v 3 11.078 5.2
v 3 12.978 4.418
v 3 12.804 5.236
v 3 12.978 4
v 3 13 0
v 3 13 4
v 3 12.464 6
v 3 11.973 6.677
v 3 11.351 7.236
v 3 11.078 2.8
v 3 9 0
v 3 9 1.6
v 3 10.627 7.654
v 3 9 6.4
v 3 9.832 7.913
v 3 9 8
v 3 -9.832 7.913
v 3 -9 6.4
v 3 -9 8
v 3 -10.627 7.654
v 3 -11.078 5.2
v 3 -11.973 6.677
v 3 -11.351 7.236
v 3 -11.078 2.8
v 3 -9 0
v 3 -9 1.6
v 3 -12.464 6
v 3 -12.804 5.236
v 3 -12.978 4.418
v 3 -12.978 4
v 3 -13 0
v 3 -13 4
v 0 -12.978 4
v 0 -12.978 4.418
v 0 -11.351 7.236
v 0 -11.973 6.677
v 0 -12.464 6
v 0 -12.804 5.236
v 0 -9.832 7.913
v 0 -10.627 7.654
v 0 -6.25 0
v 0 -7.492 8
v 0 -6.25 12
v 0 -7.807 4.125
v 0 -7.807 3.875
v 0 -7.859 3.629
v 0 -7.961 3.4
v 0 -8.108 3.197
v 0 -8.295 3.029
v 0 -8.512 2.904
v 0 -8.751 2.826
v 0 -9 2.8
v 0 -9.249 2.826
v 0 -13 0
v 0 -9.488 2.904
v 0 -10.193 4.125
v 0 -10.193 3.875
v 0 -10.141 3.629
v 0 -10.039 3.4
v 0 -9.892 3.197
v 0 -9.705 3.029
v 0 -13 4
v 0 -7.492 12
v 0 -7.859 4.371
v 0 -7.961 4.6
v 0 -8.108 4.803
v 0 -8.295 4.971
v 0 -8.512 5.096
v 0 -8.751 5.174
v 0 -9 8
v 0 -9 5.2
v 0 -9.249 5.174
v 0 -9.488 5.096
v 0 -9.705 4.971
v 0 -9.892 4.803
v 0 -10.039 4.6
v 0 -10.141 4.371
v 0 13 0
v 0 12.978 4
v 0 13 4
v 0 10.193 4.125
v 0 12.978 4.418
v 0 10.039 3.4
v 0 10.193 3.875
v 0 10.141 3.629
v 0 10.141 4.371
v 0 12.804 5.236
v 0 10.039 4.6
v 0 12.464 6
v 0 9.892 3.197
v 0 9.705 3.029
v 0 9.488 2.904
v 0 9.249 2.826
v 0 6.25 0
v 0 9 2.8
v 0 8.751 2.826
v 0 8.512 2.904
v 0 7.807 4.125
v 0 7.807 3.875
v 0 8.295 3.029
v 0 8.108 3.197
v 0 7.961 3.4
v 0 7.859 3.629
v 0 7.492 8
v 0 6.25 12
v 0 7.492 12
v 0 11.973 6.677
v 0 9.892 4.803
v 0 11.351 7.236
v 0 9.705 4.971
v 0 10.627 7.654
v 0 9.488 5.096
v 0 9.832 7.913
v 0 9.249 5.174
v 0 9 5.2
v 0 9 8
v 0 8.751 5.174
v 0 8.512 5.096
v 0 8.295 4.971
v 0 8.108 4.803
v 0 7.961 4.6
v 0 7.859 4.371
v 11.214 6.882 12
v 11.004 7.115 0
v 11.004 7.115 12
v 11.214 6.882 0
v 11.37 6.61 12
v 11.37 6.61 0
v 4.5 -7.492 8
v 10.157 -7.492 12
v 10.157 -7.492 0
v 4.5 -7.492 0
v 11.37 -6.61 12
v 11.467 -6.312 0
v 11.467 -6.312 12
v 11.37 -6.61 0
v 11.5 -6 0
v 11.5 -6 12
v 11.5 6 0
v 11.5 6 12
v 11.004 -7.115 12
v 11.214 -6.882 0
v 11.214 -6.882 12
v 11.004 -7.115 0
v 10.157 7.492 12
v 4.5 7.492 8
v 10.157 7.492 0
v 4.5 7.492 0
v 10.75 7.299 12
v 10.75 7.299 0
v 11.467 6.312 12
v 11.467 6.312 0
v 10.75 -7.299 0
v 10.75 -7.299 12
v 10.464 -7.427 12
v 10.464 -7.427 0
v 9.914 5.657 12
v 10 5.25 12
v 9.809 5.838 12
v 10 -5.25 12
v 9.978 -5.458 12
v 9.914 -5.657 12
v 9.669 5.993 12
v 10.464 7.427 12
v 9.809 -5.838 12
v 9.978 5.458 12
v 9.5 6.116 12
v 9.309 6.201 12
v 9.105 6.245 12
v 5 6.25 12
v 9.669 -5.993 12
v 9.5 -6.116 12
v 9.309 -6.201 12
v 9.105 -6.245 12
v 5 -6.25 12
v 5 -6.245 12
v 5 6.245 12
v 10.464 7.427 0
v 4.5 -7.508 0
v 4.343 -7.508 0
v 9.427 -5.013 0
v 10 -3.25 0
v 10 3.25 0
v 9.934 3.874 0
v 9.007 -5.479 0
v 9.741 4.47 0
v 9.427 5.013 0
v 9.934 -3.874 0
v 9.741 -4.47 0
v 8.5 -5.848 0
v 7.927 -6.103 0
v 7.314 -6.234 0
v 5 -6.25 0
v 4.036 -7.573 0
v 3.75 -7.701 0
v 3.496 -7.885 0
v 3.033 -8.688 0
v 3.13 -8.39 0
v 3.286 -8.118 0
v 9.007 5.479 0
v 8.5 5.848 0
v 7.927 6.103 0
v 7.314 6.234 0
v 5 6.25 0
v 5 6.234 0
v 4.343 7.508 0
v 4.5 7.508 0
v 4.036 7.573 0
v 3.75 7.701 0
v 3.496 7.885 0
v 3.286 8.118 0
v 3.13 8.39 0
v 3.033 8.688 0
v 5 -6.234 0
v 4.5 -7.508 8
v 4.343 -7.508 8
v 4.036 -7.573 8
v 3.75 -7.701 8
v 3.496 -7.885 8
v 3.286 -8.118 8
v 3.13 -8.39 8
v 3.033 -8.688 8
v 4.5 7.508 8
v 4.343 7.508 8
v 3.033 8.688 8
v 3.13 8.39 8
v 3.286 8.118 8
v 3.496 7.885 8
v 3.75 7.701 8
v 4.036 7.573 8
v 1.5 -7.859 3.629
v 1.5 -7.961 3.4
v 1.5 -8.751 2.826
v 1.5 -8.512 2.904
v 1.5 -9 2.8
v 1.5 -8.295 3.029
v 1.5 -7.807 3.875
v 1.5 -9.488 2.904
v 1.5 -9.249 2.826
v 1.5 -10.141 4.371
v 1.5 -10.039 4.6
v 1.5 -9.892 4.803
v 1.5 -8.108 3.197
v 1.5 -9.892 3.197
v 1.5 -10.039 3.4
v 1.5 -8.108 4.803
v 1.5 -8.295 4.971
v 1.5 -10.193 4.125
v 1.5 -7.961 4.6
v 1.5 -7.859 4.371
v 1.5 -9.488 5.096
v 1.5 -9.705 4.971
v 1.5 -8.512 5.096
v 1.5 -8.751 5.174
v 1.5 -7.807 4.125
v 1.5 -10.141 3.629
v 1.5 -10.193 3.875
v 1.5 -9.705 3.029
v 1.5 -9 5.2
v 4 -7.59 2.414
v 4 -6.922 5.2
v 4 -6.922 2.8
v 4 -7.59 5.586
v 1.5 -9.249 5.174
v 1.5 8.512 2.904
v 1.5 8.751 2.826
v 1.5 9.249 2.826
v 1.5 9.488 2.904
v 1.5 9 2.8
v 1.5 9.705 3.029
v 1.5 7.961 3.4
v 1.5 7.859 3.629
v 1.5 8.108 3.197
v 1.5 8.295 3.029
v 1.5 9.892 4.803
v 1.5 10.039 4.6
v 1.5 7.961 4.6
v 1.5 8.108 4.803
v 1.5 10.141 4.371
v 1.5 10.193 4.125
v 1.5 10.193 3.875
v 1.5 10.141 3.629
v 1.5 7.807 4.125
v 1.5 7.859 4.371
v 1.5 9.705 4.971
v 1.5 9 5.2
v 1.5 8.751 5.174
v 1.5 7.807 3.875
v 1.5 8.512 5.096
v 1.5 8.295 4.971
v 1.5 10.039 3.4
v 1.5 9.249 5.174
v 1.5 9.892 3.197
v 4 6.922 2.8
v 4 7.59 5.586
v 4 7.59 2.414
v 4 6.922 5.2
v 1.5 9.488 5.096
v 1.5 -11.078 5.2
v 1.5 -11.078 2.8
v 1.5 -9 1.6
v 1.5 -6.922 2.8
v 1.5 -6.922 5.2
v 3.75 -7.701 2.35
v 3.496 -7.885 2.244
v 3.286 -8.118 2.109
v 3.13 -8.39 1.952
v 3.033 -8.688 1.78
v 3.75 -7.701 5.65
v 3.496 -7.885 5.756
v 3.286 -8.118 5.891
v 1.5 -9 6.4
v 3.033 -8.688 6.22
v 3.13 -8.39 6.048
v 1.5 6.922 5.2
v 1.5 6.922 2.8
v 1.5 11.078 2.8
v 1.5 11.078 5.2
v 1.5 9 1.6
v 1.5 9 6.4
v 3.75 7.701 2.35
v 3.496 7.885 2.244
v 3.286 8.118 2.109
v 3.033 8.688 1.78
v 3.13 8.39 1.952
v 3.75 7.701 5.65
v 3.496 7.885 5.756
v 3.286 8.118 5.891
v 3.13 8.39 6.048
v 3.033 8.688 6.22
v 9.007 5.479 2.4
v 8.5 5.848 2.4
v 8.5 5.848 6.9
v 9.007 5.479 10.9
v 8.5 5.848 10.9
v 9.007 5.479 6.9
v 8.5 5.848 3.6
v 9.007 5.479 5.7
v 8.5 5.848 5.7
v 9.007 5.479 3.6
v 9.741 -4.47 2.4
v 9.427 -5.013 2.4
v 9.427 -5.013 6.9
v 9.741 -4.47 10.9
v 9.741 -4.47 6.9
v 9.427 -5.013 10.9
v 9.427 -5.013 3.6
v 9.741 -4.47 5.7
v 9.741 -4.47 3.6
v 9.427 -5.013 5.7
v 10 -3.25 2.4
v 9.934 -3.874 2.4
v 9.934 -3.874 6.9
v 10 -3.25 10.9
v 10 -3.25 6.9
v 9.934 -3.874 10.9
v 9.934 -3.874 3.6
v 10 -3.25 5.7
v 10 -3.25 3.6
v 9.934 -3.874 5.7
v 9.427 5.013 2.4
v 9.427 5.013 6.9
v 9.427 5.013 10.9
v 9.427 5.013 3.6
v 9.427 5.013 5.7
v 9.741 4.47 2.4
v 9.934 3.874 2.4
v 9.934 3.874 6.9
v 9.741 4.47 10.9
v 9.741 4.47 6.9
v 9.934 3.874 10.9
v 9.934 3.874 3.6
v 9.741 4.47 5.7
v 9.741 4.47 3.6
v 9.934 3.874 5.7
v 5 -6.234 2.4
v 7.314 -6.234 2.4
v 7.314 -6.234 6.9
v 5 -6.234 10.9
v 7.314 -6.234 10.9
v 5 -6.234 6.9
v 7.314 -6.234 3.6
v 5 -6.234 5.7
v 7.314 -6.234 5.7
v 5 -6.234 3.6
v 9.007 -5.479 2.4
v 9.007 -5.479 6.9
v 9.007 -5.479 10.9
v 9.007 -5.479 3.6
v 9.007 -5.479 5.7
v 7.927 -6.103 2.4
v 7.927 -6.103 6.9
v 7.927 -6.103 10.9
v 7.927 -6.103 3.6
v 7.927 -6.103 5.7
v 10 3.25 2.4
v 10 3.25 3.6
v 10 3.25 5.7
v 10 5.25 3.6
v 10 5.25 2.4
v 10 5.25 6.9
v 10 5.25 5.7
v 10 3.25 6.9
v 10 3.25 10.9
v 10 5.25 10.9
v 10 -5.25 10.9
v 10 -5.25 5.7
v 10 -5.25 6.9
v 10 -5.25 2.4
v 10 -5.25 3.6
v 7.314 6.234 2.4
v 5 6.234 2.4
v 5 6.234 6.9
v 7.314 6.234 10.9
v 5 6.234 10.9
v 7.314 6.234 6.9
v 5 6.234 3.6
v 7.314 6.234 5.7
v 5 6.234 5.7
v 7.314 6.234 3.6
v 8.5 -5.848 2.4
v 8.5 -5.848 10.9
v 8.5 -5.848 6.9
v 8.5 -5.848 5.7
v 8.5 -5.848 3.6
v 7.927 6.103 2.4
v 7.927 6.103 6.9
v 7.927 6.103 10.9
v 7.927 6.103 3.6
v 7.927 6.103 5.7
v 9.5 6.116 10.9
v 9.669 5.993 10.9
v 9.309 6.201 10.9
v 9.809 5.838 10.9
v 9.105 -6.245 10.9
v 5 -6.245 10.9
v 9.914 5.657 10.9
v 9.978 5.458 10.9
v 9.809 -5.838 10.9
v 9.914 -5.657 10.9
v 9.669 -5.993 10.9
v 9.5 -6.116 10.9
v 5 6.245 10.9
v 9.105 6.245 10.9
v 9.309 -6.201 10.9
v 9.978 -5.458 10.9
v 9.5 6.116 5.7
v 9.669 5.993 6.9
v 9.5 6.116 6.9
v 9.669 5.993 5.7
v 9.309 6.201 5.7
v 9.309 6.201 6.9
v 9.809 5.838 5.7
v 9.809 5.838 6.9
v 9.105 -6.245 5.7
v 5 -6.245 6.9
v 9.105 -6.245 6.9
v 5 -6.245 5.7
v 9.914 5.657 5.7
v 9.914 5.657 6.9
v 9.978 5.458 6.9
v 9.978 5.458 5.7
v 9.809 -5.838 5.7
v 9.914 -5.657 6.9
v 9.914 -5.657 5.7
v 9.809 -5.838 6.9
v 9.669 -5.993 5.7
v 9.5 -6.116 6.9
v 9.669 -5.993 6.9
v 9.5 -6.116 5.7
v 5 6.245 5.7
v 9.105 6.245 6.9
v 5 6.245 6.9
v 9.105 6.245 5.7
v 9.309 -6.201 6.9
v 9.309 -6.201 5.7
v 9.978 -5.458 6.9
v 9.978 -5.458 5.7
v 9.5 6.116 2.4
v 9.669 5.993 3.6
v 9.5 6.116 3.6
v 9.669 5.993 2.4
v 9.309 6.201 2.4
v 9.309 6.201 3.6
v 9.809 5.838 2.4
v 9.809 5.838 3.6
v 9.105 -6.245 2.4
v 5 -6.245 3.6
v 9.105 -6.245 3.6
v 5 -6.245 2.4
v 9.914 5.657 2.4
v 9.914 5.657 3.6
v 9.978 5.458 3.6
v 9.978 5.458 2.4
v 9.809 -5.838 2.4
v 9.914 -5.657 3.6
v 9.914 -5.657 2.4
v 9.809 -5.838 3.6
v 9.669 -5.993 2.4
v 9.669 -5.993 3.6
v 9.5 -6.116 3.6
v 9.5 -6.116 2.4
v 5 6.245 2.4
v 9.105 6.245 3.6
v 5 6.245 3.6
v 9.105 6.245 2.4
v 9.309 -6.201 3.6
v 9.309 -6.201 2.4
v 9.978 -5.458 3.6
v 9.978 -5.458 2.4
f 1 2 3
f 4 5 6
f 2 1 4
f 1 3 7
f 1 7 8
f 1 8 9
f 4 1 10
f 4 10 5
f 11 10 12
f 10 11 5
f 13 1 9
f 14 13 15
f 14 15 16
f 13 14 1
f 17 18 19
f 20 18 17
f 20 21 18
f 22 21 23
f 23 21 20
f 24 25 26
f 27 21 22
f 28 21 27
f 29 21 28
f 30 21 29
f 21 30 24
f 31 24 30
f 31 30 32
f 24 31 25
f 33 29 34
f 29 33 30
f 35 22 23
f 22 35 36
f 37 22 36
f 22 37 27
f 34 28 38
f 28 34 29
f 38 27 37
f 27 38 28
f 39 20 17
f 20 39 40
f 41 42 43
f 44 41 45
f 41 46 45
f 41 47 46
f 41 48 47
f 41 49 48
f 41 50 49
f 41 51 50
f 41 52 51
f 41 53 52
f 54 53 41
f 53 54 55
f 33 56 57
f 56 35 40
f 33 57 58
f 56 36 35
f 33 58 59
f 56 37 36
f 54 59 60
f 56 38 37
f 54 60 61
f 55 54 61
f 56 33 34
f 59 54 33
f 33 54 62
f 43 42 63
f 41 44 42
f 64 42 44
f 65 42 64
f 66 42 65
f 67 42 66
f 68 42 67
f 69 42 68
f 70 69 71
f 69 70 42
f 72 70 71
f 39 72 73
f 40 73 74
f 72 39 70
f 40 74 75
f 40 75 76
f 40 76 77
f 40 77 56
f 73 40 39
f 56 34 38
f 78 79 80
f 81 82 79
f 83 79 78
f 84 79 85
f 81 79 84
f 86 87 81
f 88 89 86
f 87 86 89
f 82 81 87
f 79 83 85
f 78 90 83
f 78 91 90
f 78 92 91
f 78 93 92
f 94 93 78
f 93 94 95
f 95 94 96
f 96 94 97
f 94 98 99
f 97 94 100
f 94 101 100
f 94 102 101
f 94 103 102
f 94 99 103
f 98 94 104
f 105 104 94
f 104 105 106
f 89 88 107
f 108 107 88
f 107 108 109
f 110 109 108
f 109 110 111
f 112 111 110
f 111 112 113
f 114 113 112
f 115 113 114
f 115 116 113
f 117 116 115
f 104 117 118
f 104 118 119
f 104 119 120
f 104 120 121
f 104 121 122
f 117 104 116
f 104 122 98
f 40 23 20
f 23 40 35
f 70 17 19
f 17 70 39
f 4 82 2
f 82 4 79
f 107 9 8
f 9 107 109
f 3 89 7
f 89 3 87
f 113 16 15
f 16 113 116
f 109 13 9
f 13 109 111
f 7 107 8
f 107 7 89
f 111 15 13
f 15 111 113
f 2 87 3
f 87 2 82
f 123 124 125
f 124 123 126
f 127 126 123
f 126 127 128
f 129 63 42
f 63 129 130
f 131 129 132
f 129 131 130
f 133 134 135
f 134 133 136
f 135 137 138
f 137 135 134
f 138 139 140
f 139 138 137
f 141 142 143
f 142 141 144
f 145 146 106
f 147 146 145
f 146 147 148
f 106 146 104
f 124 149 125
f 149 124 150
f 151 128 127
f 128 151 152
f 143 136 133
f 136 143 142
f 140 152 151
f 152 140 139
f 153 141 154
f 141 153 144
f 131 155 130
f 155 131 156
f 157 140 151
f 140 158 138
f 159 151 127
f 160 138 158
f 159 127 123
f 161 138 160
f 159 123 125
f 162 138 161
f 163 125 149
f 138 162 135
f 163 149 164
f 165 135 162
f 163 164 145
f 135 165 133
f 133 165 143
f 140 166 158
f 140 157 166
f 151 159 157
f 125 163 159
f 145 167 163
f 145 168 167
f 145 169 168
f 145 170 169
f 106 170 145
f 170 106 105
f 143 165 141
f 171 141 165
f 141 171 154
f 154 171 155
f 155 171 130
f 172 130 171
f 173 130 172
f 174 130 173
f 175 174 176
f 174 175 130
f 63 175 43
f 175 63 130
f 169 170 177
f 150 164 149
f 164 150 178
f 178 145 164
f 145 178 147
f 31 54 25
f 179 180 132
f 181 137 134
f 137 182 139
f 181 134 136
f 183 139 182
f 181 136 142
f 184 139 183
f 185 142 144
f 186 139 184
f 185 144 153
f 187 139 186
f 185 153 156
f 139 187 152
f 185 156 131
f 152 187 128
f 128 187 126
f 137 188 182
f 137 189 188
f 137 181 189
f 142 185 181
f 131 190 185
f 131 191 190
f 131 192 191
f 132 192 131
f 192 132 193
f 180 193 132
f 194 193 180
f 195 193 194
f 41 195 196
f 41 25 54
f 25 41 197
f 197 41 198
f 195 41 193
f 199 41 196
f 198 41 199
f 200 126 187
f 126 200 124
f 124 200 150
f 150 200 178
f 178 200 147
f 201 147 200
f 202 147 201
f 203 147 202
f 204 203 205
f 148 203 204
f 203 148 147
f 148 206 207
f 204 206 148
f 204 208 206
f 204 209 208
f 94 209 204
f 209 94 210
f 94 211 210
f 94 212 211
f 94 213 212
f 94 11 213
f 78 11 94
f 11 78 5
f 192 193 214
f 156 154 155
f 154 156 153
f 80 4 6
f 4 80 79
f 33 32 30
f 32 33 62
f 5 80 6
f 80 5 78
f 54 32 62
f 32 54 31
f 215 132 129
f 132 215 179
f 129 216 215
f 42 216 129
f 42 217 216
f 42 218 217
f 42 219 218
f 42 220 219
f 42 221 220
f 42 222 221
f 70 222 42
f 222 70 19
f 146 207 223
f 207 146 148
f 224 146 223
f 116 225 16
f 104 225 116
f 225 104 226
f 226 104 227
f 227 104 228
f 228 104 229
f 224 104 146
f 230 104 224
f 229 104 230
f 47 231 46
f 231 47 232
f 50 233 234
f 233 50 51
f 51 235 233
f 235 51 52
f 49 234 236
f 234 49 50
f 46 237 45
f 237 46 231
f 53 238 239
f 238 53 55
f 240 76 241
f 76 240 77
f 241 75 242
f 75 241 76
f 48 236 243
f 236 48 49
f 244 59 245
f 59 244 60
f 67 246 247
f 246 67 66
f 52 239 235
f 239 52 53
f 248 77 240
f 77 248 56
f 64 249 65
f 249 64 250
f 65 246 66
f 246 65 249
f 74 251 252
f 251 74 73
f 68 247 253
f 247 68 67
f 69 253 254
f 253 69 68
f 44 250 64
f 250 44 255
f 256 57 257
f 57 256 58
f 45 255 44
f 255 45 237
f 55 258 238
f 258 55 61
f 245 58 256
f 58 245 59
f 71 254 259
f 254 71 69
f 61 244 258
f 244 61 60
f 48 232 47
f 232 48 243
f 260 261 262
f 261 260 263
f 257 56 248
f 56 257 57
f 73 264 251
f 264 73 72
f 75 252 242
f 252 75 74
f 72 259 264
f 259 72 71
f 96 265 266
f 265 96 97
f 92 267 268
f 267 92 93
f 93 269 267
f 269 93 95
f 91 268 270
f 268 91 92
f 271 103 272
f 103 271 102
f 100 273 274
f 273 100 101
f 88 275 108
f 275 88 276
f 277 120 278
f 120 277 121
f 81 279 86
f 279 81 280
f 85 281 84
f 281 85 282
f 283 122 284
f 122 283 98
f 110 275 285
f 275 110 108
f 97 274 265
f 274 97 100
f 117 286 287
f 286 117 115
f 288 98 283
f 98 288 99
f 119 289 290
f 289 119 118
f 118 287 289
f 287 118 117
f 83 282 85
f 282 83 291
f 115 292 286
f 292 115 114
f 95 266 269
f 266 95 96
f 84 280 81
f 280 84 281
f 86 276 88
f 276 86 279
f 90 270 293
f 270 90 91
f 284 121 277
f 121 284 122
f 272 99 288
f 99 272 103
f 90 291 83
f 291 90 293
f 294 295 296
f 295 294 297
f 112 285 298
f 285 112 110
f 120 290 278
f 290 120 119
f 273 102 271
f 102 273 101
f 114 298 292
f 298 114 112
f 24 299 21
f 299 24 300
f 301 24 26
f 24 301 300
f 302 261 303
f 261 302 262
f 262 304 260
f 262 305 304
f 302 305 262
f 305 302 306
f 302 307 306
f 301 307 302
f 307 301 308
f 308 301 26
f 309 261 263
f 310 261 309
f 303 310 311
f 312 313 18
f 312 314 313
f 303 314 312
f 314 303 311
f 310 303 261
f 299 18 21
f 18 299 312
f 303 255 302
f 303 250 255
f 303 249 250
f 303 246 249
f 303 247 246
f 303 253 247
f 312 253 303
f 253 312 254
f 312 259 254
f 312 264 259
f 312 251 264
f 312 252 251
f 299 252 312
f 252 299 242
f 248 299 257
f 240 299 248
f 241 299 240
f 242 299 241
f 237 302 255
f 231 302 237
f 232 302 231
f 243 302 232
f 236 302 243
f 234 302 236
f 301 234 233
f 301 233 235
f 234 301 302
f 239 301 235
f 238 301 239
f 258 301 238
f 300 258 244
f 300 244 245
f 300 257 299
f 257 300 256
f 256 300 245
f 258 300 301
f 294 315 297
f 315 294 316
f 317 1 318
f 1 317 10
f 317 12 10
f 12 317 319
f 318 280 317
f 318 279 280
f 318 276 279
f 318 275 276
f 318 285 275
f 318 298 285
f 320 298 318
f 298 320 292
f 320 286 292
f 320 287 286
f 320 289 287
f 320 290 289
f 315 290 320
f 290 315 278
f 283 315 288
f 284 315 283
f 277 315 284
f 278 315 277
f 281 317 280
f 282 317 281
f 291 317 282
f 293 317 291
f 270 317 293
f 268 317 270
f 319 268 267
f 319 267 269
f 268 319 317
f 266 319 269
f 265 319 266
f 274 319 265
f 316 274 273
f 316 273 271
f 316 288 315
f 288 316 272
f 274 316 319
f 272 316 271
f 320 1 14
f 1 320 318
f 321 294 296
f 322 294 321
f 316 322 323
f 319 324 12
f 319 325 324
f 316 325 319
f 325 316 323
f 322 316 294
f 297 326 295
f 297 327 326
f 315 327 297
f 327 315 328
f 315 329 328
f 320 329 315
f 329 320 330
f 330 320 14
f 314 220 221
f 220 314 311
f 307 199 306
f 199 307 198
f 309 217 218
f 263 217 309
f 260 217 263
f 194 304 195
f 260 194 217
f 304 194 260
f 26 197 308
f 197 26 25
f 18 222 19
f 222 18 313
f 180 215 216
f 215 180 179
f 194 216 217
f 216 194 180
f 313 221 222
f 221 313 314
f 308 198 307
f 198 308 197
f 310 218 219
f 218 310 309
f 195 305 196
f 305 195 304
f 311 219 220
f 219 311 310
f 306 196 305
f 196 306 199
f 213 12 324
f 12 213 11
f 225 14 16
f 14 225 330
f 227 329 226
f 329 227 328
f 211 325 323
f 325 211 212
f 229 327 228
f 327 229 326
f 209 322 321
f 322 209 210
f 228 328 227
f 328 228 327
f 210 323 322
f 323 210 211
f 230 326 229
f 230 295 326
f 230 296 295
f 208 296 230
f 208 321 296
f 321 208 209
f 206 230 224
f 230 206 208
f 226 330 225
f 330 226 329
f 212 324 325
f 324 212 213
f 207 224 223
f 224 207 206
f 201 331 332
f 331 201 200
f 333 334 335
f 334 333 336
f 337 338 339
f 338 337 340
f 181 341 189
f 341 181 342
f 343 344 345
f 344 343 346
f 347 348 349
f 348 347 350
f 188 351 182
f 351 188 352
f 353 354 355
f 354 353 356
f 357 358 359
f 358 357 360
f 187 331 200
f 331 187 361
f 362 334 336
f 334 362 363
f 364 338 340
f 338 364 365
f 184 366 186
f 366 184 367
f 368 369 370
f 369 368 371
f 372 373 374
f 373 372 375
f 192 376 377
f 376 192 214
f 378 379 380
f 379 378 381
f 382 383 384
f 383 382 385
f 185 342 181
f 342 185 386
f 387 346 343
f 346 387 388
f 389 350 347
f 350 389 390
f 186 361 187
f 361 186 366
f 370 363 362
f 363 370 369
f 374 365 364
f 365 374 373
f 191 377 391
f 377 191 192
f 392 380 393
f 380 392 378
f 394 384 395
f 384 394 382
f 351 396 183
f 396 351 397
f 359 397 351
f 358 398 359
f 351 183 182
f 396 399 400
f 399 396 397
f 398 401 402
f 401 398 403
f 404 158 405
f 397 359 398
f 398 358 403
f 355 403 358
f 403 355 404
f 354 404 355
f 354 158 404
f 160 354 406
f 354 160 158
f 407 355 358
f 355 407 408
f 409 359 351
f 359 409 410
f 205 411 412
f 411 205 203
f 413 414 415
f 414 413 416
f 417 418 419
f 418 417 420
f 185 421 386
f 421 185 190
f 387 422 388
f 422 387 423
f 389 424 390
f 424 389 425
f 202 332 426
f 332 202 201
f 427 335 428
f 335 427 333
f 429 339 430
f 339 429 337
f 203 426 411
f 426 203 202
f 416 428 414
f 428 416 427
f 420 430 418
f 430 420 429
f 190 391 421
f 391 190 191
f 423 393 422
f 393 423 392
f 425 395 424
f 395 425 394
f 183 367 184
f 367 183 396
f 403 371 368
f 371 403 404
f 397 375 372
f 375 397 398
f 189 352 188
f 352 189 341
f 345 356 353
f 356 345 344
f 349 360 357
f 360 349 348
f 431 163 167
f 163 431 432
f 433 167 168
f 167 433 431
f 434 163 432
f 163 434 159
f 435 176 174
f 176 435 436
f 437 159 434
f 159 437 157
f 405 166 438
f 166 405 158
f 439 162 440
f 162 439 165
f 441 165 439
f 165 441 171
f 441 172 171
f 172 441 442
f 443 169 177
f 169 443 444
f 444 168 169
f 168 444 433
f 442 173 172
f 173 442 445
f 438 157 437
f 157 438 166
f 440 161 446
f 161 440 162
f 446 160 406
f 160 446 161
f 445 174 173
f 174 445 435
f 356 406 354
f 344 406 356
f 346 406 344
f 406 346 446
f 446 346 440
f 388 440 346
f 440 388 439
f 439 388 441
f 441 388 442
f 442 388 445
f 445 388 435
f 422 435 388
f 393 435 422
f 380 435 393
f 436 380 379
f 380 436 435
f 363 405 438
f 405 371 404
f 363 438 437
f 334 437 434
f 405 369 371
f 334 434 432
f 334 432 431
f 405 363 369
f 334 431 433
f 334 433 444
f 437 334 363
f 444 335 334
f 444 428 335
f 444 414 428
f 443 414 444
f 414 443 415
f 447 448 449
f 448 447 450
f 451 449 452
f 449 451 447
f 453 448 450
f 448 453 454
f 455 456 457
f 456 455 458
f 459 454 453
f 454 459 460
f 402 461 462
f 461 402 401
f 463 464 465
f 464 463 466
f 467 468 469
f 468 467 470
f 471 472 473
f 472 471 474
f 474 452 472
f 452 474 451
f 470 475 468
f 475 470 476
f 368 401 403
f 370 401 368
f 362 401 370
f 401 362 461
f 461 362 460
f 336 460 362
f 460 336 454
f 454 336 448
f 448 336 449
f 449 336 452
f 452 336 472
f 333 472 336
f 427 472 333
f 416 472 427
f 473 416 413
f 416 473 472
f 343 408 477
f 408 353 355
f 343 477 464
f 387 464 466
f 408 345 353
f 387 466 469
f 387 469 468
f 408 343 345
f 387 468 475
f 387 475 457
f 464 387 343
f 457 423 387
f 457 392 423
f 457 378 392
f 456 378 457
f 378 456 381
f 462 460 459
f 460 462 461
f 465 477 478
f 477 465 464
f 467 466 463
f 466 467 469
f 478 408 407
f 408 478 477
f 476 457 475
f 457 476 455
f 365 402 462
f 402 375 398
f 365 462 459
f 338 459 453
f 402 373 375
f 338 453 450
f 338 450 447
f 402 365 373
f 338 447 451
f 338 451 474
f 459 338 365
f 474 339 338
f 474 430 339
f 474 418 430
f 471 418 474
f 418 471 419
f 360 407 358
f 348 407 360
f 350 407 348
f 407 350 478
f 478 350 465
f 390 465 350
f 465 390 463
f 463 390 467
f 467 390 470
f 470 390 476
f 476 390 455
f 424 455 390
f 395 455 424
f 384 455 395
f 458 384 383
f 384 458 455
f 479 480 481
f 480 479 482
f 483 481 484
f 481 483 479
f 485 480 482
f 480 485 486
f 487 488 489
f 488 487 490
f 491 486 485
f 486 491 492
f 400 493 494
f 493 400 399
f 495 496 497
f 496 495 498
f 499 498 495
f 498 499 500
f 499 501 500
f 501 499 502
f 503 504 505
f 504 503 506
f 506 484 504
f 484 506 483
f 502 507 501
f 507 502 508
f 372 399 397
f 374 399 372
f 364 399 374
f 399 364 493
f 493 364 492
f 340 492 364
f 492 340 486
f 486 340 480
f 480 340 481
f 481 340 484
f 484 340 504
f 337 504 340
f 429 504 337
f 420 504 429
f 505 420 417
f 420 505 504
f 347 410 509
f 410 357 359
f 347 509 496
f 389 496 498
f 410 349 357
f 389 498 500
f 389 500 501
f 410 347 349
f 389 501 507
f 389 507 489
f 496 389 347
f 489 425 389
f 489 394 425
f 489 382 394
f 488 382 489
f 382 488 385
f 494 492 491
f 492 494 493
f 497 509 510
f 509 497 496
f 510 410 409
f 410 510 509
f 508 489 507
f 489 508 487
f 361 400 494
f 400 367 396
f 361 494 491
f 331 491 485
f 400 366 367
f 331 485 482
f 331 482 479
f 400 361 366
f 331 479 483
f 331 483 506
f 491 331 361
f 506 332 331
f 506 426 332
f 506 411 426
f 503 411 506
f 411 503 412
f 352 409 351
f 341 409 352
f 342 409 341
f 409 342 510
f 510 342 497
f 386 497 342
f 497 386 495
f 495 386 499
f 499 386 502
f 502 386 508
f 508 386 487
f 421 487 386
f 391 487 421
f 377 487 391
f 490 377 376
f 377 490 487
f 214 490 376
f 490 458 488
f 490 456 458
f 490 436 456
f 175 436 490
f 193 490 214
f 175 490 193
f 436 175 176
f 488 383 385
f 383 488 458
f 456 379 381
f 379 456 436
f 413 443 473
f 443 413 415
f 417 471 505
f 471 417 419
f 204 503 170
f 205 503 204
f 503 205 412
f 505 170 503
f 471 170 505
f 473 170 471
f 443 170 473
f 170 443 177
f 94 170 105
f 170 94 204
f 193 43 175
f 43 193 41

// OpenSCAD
//Bracket for 12mm Micro Motor with Metal Gearbox.
//Oktay Gülmez, 19/02/2016.
//GNU GPL.

//parameters:
//Bracket lenght (10-20mm.)
lenght=12; 
//(Diagonal size of the nuts; small=4,4mm. or large=5,2mm.)
nuts=4.4; 

$fn=30;
module inside(){
    difference(){
        union(){
            translate([10,0,4]) rotate([0,90,0]) minkowski(){
                cube([6,6.5,30], center=true);
                cylinder(r=3);
            }
          
        }
       
    }
}

module plate(){
    difference(){
        union(){
            translate([0,0,4]) rotate([0,90,0]) minkowski(){
                cube([10,10.5,0.2], center=true);
                cylinder(r=1);
            }
          
        }
       
    }
}
    
module bracket(){    
difference(){
    union(){
        translate([lenght-4,-9,0]) cylinder(h=3, r=4);
        translate([lenght-4,9,0]) cylinder(h=3, r=4);
        
        translate([lenght/2-0.5,0,4]) rotate([0,90,0]) minkowski(){
             cube([12,12,lenght-1], center=true);
            cylinder(r=1.5);
        }
        
        translate([lenght-4,-9-4,0]) cube([4,18+8,3]);
        
        translate([lenght-8,-9,0]) cube([8,3,4.5]);
        translate([lenght-8,9-3,0]) cube([8,3,4.5]);
        
    }
    translate([lenght-4,-9,-1]) cylinder(h=5, r=1.2);
        translate([lenght-4,9,-1]) cylinder(h=5, r=1.2);
    translate([lenght-4,-9,1.5]) cylinder(h=2.5, r=nuts/2+0.2, $fn=6);
        translate([lenght-4,9,1.5]) cylinder(h=2.5, r=nuts/2+0.2, $fn=6);
    
    translate([lenght-8-1,-9,4.5]) rotate([0,90,0]) cylinder(h=10, r=1.5);
    translate([lenght-8-1,9,4.5]) rotate([0,90,0]) cylinder(h=10, r=1.5);
    
    inside();
    translate([0,0,0]) plate();
    translate([5.2,0,0]) plate();
     translate([8.5,0,0]) plate();
    
    translate([lenght/2,0,0]) cube([lenght+2,12.5,10], center=true);
    
    translate([-1,-15,-5]) cube([lenght+2,30,5]);
        
}
}

translate([0,0,lenght]) rotate([0,90,0]) bracket();
